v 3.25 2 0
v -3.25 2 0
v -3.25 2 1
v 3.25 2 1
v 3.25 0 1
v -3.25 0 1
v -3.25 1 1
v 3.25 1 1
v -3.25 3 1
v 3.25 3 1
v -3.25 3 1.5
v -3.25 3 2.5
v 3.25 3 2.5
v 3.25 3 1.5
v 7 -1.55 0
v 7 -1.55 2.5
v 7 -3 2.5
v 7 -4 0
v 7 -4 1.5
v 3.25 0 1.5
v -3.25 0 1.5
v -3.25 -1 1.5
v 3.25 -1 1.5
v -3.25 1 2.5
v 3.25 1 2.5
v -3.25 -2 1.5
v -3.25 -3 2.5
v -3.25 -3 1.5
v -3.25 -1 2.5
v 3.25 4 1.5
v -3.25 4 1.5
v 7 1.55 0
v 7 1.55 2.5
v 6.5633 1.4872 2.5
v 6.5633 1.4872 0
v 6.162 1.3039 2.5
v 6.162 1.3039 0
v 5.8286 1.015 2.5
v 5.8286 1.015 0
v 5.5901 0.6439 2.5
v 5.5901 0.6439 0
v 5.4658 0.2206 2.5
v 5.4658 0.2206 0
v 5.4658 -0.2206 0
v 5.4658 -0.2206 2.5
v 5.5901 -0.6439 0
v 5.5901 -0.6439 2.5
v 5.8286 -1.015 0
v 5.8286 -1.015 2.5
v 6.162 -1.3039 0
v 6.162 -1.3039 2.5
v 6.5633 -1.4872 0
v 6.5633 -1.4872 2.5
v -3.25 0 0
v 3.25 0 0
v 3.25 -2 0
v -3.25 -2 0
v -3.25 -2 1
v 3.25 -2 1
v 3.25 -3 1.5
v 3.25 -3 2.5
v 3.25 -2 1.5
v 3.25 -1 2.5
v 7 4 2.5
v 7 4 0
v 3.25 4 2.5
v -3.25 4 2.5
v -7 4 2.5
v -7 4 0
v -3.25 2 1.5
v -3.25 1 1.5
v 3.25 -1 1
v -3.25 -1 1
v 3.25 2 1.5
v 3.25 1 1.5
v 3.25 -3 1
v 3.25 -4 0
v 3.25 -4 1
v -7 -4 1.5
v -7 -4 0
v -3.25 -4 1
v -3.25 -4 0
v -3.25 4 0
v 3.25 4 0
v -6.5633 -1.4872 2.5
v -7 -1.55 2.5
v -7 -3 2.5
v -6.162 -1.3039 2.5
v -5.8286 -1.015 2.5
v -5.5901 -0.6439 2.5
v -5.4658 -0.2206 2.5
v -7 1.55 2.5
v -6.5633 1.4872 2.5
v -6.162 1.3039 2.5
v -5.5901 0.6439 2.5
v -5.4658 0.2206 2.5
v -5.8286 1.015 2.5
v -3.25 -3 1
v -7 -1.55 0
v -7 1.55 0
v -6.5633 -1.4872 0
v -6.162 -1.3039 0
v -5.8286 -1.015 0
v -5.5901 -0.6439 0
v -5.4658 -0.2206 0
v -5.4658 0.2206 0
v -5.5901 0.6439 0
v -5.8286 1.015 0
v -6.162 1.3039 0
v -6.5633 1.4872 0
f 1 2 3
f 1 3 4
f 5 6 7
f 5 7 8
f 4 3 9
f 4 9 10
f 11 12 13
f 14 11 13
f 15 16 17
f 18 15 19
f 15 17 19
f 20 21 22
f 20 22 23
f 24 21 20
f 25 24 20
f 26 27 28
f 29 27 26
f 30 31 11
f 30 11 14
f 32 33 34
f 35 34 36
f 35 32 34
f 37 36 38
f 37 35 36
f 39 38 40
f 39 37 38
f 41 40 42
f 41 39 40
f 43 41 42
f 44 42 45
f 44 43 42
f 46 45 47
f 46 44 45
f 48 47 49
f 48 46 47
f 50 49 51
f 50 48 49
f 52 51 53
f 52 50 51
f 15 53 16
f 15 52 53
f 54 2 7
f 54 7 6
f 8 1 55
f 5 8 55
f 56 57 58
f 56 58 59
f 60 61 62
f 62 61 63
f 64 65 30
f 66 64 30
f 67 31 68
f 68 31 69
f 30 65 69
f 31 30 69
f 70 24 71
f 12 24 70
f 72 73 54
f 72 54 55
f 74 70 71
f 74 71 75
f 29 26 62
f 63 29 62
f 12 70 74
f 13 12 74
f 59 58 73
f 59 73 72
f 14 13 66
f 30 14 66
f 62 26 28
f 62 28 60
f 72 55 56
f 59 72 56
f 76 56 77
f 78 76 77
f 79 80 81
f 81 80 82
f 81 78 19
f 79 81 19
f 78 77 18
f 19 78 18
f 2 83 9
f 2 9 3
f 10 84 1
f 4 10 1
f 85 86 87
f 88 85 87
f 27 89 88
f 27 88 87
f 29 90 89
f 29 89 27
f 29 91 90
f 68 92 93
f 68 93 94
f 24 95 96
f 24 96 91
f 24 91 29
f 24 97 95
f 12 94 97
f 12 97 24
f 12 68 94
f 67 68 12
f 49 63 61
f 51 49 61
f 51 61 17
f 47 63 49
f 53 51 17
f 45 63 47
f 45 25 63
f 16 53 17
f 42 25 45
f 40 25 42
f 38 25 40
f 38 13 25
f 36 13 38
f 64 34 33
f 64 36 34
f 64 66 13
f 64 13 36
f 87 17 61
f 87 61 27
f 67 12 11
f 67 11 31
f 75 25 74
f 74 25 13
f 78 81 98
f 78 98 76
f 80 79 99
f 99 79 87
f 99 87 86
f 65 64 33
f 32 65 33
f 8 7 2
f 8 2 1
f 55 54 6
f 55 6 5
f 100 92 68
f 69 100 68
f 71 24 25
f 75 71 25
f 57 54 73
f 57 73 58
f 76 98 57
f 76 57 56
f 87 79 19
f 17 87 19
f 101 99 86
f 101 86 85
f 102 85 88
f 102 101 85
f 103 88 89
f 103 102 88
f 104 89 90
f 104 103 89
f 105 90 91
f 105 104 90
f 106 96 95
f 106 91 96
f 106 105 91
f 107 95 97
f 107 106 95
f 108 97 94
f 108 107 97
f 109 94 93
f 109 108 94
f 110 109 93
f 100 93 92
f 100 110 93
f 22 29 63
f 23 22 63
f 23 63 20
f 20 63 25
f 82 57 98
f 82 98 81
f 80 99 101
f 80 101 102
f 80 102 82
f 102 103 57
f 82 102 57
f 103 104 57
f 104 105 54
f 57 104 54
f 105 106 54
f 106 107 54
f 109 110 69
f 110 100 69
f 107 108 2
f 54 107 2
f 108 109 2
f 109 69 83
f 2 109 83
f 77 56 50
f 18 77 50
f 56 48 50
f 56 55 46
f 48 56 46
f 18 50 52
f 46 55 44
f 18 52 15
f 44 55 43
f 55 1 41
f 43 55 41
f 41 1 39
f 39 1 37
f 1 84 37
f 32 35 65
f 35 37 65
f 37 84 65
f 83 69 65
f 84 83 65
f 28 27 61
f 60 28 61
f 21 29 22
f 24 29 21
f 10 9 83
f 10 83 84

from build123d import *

# Parameters (mm, degrees)
F0_R     = 1.55
F1_DEPTH = 2.5
F3_DEPTH = 2.501
F4_W     = 6.5
F4_H     = 1
F5_DEPTH = 1
F6_W     = 6.5
F6_H     = 1
F7_DEPTH = 1
F8_SIZE  = 0.99999


# Not quite as in the source:
# - a fillet or chamfer is up to 0.001 mm smaller than in the source, because OpenCascade refuses the exact size


with BuildPart() as f1:
    # F0 (on Top) → F1 (new body)
    with BuildSketch(Plane.XY):
        with BuildLine():
            Line((7, 4), (-7, 4))
            ThreePointArc((-7, 4), (-9.8284271247, 2.8284271247), (-11, 0))
            ThreePointArc((-11, 0), (-9.8284271247, -2.8284271247), (-7, -4))
            Line((-7, -4), (7, -4))
            ThreePointArc((7, -4), (9.8284271247, -2.8284271247), (11, 0))
            ThreePointArc((11, 0), (9.8284271247, 2.8284271247), (7, 4))
        make_face()
        with Locations((-7, 0)):
            Circle(F0_R, mode=Mode.SUBTRACT)
        with Locations((7, 0)):
            Circle(F0_R, mode=Mode.SUBTRACT)
    extrude(amount=F1_DEPTH)

    # F2 (on face) → F3 (cut, through all)
    with BuildSketch(Plane.XY.offset(2.5)):
        with BuildLine():
            Line((-7, 1.55), (-7, 4))
            ThreePointArc((-7, 4), (-11, 0), (-7, -4))
            Line((-7, -4), (-7, -1.55))
            ThreePointArc((-7, -1.55), (-8.55, 0), (-7, 1.55))
        make_face()
        with BuildLine():
            ThreePointArc((7, -4), (11, 0), (7, 4))
            Line((7, 4), (7, 1.55))
            ThreePointArc((7, 1.55), (8.0960155108, 1.0960155108), (8.55, 0))
            ThreePointArc((8.55, 0), (8.0960155108, -1.0960155108), (7, -1.55))
            Line((7, -1.55), (7, -4))
        make_face()
    extrude(amount=-F3_DEPTH, mode=Mode.SUBTRACT)

    # F4 (on face) → F5 (cut)
    with BuildSketch(Plane.XY.offset(2.5)):
        with Locations((0, 1.5)):
            Rectangle(F4_W, F4_H)
        with Locations((0, -2.5)):
            Rectangle(F4_W, F4_H)
        with Locations((0, -0.5)):
            Rectangle(F4_W, F4_H)
        with Locations((0, 3.5)):
            Rectangle(F4_W, F4_H)
    extrude(amount=-F5_DEPTH, mode=Mode.SUBTRACT)

    # F6 (on face) → F7 (cut)
    with BuildSketch(Plane(origin=(0, 0, 0), x_dir=(1, 0, 0), z_dir=(0, 0, -1))):
        with Locations((0, -0.5)):
            Rectangle(F6_W, F6_H)
        with Locations((0, 3.5)):
            Rectangle(F6_W, F6_H)
        with Locations((0, 1.5)):
            Rectangle(F6_W, F6_H)
        with Locations((0, -2.5)):
            Rectangle(F6_W, F6_H)
    extrude(amount=-F7_DEPTH, mode=Mode.SUBTRACT)

    # F8 (size 1 in the source; OpenCascade refuses exactly that, so slightly less here)
    f8_edges = [f1.edges().sort_by_distance(p)[0] for p in [
        (0, 3, 0),
        (0, 1, 0),
        (0, -1, 0),
        (0, -3, 0),
        (0, -4, 2.5),
        (0, -2, 2.5),
        (0, 0, 2.5),
        (0, 2, 2.5),
    ]]
    chamfer(f8_edges, length=F8_SIZE)


solid = f1.part
